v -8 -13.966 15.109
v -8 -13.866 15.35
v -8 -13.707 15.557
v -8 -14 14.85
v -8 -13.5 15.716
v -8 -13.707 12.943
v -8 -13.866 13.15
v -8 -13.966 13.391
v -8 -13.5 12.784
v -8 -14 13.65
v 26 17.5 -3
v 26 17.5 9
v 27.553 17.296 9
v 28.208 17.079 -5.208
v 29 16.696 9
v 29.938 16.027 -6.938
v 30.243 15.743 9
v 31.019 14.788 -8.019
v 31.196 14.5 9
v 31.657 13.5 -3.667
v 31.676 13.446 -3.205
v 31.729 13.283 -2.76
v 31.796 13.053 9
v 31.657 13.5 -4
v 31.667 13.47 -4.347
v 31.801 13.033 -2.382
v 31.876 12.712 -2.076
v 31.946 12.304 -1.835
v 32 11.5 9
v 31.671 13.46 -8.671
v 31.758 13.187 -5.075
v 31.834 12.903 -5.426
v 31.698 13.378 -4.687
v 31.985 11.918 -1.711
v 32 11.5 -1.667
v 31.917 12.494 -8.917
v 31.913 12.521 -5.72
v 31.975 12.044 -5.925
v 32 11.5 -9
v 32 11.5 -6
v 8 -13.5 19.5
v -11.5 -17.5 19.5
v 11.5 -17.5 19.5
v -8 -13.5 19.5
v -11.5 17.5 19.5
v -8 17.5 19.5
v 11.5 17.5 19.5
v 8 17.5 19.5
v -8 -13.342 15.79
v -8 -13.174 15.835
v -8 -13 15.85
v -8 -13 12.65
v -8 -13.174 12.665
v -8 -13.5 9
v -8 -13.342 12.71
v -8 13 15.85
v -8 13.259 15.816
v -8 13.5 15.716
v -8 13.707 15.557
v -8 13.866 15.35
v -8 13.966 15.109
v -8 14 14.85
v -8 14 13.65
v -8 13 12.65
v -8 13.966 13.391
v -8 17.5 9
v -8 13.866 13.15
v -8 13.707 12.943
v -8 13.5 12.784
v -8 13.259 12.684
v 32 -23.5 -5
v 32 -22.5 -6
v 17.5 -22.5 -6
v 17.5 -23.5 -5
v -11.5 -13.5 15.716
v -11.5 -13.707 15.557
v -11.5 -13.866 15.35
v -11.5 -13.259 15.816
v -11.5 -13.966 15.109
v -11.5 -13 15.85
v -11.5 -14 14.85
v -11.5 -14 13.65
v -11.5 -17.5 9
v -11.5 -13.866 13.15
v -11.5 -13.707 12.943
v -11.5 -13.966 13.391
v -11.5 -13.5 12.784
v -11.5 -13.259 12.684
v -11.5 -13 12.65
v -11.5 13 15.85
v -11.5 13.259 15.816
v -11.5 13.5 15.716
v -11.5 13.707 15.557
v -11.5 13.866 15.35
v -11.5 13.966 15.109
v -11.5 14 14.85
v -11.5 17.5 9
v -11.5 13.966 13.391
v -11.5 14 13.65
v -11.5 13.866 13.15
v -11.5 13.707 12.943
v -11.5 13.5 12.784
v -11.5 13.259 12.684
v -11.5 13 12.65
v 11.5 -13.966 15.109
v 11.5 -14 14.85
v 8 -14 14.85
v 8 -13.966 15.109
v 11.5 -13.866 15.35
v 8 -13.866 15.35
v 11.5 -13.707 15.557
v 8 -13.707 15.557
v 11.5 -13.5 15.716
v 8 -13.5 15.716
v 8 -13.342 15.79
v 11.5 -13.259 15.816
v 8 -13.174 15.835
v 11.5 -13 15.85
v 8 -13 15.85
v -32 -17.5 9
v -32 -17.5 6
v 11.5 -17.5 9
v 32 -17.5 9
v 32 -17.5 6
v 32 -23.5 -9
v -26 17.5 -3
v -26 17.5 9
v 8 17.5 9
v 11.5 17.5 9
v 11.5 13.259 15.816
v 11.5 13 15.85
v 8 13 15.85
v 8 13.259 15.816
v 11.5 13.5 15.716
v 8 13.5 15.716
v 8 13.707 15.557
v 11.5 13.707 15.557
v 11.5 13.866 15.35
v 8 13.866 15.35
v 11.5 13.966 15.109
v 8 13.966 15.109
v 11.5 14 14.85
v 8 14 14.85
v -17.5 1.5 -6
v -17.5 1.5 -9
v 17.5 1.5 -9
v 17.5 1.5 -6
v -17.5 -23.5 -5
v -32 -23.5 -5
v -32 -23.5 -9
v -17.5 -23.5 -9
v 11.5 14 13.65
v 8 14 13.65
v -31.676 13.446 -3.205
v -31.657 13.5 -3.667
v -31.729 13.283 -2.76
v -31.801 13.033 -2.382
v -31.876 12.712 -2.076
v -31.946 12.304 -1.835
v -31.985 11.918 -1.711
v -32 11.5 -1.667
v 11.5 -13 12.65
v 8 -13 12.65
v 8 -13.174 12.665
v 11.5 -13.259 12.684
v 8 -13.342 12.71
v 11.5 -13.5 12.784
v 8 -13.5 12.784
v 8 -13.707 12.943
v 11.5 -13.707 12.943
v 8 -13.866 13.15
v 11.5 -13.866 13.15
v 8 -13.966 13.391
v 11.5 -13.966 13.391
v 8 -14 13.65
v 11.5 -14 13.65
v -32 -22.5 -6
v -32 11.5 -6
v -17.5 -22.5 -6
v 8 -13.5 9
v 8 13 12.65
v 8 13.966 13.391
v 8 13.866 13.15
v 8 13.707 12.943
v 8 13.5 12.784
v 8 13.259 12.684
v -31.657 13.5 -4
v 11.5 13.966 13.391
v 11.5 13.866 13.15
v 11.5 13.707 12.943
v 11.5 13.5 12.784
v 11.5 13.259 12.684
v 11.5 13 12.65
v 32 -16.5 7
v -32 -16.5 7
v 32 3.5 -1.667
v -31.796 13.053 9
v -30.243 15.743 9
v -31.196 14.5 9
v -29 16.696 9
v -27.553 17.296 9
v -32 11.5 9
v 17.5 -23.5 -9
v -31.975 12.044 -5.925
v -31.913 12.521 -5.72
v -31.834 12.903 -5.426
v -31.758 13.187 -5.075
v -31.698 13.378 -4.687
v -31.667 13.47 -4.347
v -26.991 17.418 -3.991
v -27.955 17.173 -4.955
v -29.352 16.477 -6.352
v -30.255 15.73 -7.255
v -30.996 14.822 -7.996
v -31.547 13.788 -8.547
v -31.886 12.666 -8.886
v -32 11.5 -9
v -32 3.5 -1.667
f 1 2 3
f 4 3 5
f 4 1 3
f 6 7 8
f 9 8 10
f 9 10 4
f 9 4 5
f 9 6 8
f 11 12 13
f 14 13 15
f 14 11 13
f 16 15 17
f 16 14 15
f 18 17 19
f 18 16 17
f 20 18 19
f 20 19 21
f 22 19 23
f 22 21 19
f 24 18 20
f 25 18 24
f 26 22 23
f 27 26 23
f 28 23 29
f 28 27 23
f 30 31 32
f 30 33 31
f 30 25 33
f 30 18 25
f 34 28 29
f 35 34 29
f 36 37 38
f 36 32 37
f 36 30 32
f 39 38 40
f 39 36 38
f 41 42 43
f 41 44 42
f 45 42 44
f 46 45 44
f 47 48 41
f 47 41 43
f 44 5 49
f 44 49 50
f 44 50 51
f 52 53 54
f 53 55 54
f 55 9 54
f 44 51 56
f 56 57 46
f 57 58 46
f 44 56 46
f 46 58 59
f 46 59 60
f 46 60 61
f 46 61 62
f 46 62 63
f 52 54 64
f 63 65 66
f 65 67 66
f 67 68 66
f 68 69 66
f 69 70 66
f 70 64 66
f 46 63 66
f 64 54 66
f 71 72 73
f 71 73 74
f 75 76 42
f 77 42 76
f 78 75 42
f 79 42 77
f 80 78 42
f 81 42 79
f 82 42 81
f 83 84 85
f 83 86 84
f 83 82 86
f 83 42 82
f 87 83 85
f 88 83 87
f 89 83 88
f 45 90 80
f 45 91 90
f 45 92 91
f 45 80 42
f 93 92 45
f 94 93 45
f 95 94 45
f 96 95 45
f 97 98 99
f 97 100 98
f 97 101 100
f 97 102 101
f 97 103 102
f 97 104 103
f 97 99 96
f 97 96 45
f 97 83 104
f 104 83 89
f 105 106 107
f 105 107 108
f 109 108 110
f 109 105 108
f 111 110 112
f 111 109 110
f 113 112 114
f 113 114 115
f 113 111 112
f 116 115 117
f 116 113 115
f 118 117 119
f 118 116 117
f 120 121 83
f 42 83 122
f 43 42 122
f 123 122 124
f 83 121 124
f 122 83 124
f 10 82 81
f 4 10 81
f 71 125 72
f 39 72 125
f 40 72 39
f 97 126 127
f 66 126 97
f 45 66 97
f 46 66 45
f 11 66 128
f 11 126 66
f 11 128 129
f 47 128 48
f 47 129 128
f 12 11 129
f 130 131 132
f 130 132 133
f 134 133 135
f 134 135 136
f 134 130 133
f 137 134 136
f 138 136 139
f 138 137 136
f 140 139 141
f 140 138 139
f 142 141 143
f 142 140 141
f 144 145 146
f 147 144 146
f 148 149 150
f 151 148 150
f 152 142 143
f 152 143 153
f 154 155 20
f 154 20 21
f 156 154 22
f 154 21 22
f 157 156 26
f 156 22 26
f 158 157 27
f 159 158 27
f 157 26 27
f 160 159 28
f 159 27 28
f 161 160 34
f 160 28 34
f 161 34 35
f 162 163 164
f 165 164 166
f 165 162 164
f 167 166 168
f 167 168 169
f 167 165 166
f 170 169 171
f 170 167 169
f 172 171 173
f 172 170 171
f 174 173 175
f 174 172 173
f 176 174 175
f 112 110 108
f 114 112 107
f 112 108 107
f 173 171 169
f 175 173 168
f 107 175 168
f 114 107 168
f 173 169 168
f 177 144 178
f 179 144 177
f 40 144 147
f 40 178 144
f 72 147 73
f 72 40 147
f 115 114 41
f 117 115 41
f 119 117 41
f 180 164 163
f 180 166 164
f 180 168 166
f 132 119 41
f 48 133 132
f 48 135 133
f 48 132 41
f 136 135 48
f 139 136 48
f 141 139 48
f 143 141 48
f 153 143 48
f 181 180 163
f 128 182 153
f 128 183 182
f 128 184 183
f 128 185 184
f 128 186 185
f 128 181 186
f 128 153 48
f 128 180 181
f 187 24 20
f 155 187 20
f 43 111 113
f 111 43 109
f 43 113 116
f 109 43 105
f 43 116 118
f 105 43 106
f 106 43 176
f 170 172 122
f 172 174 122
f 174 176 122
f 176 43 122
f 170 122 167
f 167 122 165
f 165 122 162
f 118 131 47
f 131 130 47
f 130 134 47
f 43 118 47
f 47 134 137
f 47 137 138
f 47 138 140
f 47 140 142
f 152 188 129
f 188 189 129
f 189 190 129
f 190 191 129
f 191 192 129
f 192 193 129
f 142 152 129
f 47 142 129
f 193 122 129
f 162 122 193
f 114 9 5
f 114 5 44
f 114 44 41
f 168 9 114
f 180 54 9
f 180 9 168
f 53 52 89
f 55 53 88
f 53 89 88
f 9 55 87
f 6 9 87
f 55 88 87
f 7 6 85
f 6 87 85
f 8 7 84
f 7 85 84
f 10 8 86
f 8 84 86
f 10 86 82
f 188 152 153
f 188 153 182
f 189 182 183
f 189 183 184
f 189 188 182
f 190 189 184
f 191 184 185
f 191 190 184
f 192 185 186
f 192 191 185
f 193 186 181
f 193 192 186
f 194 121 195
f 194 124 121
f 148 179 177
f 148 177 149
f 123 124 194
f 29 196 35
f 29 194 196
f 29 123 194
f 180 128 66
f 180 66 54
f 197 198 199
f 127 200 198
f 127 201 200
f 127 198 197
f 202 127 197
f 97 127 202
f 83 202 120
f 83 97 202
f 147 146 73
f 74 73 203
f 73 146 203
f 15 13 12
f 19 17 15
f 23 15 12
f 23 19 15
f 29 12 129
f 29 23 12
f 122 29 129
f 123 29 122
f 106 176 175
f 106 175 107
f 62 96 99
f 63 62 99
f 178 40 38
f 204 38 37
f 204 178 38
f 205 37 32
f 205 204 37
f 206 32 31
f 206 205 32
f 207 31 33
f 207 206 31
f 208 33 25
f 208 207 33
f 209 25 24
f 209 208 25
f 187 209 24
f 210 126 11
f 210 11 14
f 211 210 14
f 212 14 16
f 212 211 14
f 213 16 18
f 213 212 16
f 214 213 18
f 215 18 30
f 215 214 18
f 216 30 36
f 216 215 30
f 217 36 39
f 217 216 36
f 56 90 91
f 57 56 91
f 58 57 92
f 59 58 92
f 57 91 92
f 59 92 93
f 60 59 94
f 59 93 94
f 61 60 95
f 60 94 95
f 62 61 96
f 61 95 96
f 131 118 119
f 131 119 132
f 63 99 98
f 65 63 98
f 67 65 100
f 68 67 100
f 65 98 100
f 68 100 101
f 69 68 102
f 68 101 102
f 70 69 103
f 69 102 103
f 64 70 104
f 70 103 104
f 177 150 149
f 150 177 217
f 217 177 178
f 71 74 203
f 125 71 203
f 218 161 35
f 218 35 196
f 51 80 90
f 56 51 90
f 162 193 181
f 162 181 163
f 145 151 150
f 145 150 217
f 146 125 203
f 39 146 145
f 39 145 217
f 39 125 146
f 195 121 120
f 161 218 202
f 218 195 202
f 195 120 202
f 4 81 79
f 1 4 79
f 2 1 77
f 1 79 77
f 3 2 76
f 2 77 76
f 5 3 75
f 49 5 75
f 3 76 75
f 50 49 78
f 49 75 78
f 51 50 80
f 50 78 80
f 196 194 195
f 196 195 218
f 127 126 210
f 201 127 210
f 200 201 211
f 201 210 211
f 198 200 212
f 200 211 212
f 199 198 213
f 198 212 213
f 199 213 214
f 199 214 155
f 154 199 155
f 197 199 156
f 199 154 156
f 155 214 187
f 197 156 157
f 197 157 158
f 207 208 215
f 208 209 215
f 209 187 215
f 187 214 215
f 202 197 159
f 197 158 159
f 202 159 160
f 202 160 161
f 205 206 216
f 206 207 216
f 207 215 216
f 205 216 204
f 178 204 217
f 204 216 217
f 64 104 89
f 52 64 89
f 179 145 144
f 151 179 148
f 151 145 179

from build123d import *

# Parameters (mm, degrees)
F1_DEPTH     = 32
F3_DEPTH     = 64
F4_W         = 3.5
F4_H         = 35
F5_DEPTH     = 10.5
F7_DEPTH     = 3.5
F8_W         = 16
F8_H         = 4
F9_DEPTH     = 10.5
F10_T1_DEPTH = 48
F10_T3_DEPTH = 94
F11_W        = 35
F11_H        = 25
F12_DEPTH    = 4.001
F13_R        = 2


# Not quite as in the source:
# - a fillet or chamfer that OpenCascade refuses, or shapes differently, is made with other operations: its cross-section is extruded or revolved along the edge and cut away or added
# - a pattern or mirror of a feature is missing from the dataset's text; its kind, count and spacing are read off the source's solid


with BuildPart() as f1:
    # F0 (on Right) → F1 (new body, symmetric)
    with BuildSketch(Plane.YZ):
        Polygon((13.5, -6), (-22.5, -6), (-23.5, -5), (-23.5, -9), (17.5, -9), (17.5, 9), (-17.5, 9), (-17.5, 6), (-16.5, 7), align=None)
    extrude(amount=F1_DEPTH, both=True)

    # F2 (on face) → F3 (cut, through all)
    with BuildSketch(Plane.YZ.offset(32)):
        with BuildLine():
            Line((3.5, -1.6666666667), (13.5, -6))
            Line((13.5, -6), (13.5, -3.6666666667))
            ThreePointArc((13.5, -3.6666666667), (12.9142135624, -2.2524531043), (11.5, -1.6666666667))
            Line((11.5, -1.6666666667), (3.5, -1.6666666667))
        make_face()
    extrude(amount=-F3_DEPTH, mode=Mode.SUBTRACT)

    # F4 (on face) → F5 (join)
    with BuildSketch(Plane.XY.offset(9)):
        with Locations((-9.75, 0)):
            Rectangle(F4_W, F4_H)
    f5 = extrude(amount=F5_DEPTH)

    # F5_copies: F5 across plane
    add(f5.mirror(Plane(origin=(0, 0, 0), x_dir=(0, 0, 1), z_dir=(1, 0, 0))))

    # F6 (on face) → F7 (cut, through all)
    with BuildSketch(Plane(origin=(-11.5, 0, 0), x_dir=(0, -1, 0), z_dir=(-1, 0, 0))):
        with BuildLine():
            Line((13, 15.85), (-13, 15.85))
            ThreePointArc((-13, 15.85), (-13.7071067812, 15.5571067812), (-14, 14.85))
            Line((-14, 14.85), (-14, 13.65))
            ThreePointArc((-14, 13.65), (-13.7071067812, 12.9428932188), (-13, 12.65))
            Line((-13, 12.65), (13, 12.65))
            ThreePointArc((13, 12.65), (13.7071067812, 12.9428932188), (14, 13.65))
            Line((14, 13.65), (14, 14.85))
            ThreePointArc((14, 14.85), (13.7071067812, 15.5571067812), (13, 15.85))
        make_face()
    f7 = extrude(amount=-F7_DEPTH, mode=Mode.SUBTRACT)

    # F7_copies: F7 across plane
    add(f7.mirror(Plane(origin=(0, 0, 0), x_dir=(0, 0, 1), z_dir=(1, 0, 0))), mode=Mode.SUBTRACT)

    # F8 (on face) → F9 (join, through all)
    with BuildSketch(Plane.XY.offset(9)):
        with Locations((0, -15.5)):
            Rectangle(F8_W, F8_H)
    extrude(amount=F9_DEPTH)

    # F10: fillet of radius 6 on 3 edges, made by hand

    # F10_s2 → F10_t1 (cut)
    with BuildSketch(Plane.XY.offset(-24)):
        with BuildLine():
            ThreePointArc((26, 17.5), (30.2426406871, 15.7426406871), (32, 11.5))
            Line((32, 11.5), (32, 17.5))
            Line((32, 17.5), (26, 17.5))
        make_face()
        with BuildLine():
            ThreePointArc((-26, 17.5), (-30.2426406871, 15.7426406871), (-32, 11.5))
            Line((-32, 11.5), (-32, 17.5))
            Line((-32, 17.5), (-26, 17.5))
        make_face()
    extrude(amount=F10_T1_DEPTH, mode=Mode.SUBTRACT)

    # F10_s4 → F10_t3 (cut)
    with BuildSketch(Plane.YZ.offset(-47)):
        with BuildLine():
            ThreePointArc((17.5, -3), (15.7426406871, -7.2426406871), (11.5, -9))
            Line((11.5, -9), (17.5, -9))
            Line((17.5, -9), (17.5, -3))
        make_face()
    extrude(amount=F10_T3_DEPTH, mode=Mode.SUBTRACT)

    # F11 (on face) → F12 (cut, through all)
    with BuildSketch(Plane(origin=(0, 0, -9), x_dir=(1, 0, 0), z_dir=(0, 0, -1))):
        with Locations((0, 11)):
            Rectangle(F11_W, F11_H)
    extrude(amount=-F12_DEPTH, mode=Mode.SUBTRACT)

    # F13
    f13_edges = [f1.edges().sort_by_distance(p)[0] for p in [
        (0, 13.5, -6),
    ]]
    fillet(f13_edges, radius=F13_R)


solid = f1.part
